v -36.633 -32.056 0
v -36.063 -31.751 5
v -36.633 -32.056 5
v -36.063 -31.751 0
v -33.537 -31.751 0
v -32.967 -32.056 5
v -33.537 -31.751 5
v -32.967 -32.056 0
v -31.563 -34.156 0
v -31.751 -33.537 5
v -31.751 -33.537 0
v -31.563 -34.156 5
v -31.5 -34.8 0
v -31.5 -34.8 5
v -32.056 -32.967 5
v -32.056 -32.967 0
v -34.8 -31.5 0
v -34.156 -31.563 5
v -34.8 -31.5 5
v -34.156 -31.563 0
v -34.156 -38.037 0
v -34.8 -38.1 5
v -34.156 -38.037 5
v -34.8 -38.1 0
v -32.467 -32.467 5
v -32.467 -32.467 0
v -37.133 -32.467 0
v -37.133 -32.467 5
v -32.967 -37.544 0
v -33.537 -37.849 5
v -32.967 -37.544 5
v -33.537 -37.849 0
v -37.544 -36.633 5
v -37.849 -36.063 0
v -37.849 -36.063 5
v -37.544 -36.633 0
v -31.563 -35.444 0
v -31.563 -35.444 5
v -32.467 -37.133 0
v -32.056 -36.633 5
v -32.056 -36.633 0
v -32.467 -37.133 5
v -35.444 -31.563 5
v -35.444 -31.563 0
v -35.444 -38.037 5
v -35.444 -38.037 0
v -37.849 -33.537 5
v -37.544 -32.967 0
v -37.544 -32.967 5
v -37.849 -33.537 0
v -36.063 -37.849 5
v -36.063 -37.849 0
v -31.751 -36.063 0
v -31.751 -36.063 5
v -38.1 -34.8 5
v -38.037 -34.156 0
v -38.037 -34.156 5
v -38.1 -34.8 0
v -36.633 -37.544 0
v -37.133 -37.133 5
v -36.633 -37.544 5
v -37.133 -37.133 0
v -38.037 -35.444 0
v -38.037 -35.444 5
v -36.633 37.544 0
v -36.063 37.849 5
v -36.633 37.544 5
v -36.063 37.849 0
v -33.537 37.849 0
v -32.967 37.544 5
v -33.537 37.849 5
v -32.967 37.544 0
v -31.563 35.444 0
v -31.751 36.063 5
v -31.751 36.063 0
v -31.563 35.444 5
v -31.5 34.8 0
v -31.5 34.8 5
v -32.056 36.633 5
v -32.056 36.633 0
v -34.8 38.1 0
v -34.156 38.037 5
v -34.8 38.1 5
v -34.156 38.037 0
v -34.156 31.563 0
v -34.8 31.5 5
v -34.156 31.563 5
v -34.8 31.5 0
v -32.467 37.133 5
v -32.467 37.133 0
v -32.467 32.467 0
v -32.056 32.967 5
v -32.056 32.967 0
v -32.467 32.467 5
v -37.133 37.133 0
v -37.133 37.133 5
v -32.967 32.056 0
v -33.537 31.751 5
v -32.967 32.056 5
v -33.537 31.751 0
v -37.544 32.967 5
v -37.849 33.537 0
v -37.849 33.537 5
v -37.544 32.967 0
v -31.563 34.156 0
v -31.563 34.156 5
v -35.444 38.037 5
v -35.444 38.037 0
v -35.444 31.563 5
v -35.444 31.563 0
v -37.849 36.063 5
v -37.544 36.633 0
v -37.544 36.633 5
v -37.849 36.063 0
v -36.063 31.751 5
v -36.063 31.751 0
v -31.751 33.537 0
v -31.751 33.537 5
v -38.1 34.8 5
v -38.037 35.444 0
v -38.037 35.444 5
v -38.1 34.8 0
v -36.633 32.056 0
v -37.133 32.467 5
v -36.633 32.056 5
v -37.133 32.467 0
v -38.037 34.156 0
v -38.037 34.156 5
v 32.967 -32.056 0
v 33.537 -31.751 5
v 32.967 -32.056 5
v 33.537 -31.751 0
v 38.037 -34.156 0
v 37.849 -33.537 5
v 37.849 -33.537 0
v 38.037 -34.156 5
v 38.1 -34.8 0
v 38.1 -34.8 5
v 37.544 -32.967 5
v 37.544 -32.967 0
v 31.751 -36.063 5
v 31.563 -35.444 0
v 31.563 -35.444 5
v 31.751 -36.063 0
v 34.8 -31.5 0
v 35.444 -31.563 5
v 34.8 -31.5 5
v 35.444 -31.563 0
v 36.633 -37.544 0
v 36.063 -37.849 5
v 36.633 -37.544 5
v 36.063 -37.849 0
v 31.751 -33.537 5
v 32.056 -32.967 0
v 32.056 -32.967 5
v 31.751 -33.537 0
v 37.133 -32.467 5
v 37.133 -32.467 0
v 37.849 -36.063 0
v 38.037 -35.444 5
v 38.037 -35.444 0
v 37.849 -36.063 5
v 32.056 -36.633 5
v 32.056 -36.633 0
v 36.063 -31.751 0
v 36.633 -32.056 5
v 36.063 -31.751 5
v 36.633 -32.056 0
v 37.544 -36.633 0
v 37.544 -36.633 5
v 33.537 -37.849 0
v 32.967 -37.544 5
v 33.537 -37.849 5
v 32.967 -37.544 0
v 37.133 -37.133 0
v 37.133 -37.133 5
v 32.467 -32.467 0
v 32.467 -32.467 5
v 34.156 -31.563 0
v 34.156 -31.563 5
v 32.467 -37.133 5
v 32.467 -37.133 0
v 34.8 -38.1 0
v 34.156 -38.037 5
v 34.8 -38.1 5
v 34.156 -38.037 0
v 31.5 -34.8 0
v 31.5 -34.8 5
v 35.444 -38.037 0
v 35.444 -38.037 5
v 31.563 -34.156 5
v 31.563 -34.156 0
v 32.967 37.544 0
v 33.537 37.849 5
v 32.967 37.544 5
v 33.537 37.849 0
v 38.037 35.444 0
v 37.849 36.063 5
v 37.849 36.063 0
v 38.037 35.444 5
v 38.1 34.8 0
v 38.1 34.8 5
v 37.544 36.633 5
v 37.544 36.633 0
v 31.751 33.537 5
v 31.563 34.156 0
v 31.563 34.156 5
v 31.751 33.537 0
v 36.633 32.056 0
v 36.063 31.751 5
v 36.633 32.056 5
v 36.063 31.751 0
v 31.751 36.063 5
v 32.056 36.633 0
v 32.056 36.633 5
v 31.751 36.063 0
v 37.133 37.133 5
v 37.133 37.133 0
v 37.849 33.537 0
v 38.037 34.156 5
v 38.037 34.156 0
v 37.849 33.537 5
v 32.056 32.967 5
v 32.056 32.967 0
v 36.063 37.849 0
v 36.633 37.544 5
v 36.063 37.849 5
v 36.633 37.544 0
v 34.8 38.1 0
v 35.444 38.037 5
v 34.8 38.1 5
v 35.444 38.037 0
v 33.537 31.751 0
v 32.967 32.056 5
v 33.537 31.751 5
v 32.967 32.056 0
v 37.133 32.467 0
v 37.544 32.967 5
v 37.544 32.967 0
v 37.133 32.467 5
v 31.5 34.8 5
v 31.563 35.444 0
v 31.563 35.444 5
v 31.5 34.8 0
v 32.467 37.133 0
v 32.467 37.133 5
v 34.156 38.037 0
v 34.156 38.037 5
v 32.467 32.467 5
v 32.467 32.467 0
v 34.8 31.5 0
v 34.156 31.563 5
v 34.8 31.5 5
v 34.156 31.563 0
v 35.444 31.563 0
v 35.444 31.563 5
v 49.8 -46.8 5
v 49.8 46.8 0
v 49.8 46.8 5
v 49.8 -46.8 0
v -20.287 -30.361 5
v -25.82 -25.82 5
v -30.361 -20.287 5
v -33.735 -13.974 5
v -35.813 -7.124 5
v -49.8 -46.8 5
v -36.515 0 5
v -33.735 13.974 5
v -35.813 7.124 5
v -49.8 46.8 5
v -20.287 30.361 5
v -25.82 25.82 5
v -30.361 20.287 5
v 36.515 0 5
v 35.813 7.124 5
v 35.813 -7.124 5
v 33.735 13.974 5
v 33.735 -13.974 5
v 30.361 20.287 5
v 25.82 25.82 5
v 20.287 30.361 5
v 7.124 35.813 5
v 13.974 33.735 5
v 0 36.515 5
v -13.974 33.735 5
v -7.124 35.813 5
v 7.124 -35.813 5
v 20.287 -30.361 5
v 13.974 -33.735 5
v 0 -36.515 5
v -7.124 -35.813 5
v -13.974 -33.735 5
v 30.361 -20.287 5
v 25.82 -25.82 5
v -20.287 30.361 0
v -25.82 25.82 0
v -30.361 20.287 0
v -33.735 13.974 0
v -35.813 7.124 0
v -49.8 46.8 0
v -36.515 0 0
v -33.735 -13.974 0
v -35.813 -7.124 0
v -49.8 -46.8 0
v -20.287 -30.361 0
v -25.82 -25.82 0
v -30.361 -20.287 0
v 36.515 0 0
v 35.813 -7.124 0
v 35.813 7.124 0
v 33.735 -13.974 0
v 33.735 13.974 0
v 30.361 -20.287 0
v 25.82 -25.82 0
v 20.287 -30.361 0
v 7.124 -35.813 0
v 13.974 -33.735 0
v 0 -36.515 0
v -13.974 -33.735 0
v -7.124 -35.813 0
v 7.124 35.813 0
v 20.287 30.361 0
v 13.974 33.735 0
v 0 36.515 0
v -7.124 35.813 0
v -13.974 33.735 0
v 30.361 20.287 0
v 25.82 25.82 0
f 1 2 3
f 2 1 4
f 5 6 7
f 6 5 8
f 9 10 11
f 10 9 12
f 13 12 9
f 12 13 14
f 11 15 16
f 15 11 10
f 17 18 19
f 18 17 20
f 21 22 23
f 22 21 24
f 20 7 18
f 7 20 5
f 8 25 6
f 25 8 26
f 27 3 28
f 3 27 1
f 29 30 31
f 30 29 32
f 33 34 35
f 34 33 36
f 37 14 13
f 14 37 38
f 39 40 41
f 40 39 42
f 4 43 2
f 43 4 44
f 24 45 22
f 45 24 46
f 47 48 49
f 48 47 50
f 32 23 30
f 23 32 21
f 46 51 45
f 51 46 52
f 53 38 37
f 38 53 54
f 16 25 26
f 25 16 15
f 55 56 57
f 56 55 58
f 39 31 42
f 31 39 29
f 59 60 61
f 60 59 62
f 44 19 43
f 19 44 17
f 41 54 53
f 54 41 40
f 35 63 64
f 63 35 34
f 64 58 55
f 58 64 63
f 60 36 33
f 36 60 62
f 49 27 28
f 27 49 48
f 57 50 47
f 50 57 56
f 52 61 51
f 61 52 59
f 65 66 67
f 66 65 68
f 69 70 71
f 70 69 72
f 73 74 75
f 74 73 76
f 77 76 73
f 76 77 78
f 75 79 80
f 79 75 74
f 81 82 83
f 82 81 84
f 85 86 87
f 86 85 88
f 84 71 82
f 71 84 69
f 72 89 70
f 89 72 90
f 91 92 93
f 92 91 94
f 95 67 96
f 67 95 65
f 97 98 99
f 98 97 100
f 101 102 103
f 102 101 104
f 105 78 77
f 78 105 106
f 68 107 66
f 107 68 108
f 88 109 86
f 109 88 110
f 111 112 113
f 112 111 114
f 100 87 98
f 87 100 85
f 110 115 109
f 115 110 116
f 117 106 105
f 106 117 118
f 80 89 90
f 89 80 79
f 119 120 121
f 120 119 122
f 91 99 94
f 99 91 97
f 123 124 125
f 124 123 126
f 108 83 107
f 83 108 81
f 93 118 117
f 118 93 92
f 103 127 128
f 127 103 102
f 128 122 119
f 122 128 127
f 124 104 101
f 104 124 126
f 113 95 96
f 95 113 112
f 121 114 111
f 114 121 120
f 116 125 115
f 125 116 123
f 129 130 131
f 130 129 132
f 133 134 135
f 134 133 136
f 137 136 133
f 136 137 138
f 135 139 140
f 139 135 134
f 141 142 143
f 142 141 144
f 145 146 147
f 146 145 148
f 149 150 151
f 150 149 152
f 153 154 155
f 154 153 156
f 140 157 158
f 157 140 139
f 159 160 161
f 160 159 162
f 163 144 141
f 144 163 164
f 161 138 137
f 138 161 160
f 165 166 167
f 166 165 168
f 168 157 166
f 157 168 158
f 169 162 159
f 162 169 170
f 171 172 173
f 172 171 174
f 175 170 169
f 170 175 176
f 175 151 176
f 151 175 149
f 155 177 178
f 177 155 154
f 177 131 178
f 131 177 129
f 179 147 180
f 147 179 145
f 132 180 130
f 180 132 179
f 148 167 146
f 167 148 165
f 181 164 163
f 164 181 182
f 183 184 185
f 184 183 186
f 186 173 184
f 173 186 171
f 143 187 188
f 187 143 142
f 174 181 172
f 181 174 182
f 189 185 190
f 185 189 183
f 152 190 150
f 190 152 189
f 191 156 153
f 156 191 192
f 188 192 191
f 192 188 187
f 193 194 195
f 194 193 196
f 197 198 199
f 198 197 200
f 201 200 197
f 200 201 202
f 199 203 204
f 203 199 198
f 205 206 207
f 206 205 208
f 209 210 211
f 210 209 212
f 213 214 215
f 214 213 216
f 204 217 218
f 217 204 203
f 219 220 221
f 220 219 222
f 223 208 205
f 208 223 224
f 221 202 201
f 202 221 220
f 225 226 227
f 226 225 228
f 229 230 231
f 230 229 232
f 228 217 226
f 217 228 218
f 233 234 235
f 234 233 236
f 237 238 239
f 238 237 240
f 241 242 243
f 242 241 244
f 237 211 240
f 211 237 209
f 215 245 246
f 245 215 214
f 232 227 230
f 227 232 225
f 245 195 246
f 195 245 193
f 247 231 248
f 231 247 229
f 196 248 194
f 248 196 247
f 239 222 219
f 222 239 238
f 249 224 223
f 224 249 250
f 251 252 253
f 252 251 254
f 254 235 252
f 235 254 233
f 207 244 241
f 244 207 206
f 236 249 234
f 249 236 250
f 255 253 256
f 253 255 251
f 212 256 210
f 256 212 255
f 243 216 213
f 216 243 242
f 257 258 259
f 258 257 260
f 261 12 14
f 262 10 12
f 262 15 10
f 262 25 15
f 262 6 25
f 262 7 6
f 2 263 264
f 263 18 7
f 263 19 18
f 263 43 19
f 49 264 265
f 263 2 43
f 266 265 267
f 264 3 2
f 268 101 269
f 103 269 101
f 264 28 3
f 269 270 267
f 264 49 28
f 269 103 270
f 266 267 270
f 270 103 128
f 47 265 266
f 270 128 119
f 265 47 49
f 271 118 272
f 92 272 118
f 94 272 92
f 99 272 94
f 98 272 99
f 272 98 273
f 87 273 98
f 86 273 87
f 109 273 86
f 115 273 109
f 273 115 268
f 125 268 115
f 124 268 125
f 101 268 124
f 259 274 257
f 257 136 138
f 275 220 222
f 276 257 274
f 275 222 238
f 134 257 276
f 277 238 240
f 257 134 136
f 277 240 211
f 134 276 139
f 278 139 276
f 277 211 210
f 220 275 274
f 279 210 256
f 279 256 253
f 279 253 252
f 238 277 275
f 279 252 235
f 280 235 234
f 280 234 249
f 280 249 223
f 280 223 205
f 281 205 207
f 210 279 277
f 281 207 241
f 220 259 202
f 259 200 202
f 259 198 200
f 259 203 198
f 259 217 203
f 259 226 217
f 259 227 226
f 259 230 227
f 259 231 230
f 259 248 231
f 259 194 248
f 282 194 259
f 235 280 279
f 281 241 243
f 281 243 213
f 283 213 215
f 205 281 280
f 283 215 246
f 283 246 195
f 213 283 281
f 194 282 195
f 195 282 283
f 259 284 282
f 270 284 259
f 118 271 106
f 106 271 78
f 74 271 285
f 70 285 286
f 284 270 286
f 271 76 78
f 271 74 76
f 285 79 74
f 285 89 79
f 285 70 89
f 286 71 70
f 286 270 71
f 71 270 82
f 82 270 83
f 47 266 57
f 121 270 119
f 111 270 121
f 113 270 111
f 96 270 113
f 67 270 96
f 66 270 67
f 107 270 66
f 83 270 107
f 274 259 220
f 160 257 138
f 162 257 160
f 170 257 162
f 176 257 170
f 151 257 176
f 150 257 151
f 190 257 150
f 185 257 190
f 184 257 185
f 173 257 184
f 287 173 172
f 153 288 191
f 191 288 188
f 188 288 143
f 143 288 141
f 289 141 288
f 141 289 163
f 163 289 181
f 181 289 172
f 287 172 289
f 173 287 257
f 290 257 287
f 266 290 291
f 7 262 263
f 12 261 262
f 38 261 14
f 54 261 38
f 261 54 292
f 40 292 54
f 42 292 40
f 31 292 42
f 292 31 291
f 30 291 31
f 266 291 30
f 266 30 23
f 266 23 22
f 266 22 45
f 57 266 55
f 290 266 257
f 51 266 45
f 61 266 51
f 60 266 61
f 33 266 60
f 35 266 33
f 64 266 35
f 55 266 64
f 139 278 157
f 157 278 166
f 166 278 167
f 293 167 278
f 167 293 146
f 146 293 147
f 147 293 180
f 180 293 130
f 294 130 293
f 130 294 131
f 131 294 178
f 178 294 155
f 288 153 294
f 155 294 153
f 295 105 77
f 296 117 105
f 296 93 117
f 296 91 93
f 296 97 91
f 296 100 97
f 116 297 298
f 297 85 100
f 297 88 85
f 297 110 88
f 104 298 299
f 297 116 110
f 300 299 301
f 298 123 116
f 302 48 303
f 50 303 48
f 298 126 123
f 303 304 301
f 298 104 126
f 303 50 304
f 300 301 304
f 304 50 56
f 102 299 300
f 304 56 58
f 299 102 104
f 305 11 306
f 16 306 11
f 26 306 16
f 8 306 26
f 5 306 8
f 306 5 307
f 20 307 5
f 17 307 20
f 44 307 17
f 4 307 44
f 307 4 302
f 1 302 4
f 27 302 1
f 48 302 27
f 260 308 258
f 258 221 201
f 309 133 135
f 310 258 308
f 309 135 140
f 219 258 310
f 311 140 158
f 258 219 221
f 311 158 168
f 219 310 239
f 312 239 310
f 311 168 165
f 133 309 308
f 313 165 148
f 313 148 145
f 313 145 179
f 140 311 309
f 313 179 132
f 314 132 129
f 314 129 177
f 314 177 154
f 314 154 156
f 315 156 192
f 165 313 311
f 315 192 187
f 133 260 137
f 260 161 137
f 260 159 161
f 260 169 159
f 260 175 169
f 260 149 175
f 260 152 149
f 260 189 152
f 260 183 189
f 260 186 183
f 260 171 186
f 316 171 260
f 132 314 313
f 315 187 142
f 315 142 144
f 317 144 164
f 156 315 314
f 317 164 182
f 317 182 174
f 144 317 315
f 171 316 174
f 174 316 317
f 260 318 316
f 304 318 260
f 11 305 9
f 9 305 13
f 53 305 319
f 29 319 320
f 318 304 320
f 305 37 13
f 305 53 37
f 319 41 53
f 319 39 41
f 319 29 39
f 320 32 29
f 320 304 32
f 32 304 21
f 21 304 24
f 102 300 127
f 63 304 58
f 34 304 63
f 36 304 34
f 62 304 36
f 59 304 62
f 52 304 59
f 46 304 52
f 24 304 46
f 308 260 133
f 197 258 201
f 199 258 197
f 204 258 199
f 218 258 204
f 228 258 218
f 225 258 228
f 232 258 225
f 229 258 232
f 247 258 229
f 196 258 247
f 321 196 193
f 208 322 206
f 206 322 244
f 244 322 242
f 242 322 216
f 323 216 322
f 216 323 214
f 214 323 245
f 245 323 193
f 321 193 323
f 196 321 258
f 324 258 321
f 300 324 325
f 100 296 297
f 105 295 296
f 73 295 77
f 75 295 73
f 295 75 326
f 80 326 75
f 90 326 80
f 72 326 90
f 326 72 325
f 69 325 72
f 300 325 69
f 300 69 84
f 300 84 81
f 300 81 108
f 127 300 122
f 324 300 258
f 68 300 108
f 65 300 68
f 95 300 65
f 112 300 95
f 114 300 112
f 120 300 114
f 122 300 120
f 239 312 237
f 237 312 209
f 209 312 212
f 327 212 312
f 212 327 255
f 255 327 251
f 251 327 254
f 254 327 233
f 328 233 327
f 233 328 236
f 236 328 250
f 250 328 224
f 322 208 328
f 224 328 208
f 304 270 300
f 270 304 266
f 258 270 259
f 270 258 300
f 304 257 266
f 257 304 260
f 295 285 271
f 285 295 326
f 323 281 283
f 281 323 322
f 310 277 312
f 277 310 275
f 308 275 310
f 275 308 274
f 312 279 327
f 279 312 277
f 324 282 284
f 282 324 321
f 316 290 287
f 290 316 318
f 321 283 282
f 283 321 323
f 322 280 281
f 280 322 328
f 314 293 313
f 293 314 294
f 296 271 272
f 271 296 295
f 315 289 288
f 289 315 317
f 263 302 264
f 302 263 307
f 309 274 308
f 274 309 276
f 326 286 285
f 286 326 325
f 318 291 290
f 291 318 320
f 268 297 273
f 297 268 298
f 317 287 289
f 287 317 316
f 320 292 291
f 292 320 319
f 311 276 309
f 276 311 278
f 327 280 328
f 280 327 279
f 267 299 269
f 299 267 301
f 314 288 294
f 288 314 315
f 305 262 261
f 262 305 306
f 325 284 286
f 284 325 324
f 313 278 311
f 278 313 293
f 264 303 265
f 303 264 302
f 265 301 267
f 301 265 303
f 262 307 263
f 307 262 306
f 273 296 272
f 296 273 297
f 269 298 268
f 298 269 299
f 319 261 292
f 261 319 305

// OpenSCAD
$fn = 32;

// ----------------------------------------------------------------------
// Motor mount plate: NEMA34, 99.6 x 93.6 x 5 mm
// ----------------------------------------------------------------------

// --- parameters (mm) ---
plate_w = 99.6;           // plate length, X
plate_d = 93.6;           // plate width, Y
plate_t = 5;              // plate thickness
pattern = 69.6;           // NEMA34 bolt spacing
motor_d = 6.6;            // NEMA34 screw clearance
pilot_d = 73.03;          // pilot boss bore

module plate() {
  translate([-plate_w / 2, -plate_d / 2, 0]) cube([plate_w, plate_d, plate_t]);
}

module motor_holes() {
  for (sx = [-1, 1]) for (sy = [-1, 1])
    translate([sx * pattern / 2, sy * pattern / 2, -1])
      cylinder(h = plate_t + 2, d = motor_d);
}

difference() {
  union() {
    plate();
  }
  motor_holes();
  translate([0, 0, -1]) cylinder(h = plate_t + 2, d = pilot_d);
}
